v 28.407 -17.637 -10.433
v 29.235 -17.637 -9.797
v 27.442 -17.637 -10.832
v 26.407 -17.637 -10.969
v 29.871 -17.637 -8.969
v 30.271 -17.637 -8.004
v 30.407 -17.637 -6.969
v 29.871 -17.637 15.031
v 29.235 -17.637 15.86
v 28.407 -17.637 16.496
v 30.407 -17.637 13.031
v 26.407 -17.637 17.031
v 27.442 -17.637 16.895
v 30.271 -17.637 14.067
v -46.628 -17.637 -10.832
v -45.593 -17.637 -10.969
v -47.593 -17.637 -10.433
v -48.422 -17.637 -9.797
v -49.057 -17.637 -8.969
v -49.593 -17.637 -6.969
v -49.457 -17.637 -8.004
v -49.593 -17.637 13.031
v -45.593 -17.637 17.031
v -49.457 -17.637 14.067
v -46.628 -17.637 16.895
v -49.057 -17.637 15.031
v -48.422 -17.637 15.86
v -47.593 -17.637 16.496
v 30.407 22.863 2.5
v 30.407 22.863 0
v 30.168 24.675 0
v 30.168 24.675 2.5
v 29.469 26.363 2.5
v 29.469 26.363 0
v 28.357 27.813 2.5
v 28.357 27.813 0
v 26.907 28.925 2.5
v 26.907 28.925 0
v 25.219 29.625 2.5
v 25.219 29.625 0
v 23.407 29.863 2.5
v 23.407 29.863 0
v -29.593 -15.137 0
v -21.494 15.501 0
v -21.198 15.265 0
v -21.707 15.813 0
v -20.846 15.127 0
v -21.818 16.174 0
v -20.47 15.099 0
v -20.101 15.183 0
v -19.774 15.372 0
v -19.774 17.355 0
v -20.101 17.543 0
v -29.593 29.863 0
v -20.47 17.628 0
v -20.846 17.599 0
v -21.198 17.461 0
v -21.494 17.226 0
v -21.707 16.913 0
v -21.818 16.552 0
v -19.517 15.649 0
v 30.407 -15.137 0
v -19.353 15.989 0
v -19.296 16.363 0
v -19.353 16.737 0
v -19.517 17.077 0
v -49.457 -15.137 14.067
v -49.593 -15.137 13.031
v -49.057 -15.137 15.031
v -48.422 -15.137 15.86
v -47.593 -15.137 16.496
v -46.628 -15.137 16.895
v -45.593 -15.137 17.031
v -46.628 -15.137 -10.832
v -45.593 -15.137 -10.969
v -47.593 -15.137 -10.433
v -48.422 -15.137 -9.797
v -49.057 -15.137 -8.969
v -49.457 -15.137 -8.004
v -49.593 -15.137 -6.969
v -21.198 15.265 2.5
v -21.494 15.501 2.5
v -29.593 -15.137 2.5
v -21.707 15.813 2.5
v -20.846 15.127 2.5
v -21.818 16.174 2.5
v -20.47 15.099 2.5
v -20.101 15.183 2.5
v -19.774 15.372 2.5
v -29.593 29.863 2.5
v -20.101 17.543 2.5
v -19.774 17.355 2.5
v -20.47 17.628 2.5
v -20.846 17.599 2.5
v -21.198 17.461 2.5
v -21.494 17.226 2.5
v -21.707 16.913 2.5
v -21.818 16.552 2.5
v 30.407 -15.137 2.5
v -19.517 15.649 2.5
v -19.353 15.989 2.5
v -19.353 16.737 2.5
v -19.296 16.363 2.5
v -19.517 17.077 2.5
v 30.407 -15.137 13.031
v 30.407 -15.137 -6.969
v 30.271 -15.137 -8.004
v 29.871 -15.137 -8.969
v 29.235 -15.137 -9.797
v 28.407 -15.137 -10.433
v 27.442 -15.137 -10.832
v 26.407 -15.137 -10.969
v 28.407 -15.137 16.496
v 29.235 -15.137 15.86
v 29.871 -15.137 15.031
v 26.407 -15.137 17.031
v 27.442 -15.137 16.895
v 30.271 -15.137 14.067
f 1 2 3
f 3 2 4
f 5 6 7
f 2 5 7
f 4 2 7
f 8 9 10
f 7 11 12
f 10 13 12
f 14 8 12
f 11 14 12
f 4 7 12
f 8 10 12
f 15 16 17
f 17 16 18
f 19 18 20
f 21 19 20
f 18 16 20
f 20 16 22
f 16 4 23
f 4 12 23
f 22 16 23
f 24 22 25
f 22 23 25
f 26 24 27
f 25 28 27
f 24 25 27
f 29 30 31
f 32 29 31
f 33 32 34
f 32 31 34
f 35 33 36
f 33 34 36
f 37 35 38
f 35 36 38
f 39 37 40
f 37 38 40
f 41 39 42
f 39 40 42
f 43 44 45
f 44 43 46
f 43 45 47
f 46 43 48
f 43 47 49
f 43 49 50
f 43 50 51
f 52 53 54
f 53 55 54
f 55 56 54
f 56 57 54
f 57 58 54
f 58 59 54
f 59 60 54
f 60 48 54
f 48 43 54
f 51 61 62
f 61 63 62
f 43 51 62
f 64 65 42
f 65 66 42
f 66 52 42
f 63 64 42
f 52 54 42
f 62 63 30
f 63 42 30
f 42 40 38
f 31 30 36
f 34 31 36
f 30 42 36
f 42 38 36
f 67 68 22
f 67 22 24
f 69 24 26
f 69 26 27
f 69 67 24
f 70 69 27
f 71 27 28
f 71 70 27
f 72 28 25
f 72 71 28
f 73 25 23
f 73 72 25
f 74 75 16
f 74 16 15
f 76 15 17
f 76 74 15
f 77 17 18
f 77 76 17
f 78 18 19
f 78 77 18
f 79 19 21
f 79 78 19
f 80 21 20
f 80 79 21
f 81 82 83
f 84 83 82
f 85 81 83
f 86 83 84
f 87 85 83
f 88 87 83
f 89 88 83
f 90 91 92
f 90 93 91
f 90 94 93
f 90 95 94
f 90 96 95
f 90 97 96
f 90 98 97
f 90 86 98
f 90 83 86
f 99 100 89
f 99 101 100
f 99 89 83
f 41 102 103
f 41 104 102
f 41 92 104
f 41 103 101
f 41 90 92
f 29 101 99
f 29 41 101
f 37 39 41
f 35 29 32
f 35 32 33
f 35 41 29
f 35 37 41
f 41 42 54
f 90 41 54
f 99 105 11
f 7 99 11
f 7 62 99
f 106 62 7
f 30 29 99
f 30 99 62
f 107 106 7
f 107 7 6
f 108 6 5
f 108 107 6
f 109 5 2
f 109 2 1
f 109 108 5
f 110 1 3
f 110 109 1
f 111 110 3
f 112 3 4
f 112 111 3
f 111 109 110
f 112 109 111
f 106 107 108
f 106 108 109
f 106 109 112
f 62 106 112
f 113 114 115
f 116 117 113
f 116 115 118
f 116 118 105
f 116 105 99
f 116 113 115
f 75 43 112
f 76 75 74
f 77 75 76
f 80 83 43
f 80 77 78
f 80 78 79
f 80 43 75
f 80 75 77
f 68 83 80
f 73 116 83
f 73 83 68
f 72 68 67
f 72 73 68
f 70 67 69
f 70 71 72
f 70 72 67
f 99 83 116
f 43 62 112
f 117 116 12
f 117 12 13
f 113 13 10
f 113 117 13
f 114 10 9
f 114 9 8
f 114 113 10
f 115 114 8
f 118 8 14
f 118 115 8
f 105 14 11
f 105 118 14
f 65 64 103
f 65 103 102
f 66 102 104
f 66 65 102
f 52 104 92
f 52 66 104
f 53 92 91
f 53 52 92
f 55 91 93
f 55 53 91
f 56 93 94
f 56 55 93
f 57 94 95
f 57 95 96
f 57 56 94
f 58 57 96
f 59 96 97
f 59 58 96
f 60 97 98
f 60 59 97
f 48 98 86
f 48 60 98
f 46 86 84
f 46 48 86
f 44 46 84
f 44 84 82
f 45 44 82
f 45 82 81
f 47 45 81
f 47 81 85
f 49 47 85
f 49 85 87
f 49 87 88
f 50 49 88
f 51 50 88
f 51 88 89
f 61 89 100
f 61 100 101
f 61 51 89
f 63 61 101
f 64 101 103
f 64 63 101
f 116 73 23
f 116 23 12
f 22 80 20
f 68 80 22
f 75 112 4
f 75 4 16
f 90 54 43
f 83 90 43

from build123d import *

# Parameters (mm, degrees)
CROQUIS4_R              = 1.267922183
SALIENTE_EXTRUIR3_DEPTH = 2.5
SALIENTE_EXTRUIR4_DEPTH = 2.5


with BuildPart() as part:
    # Croquis4 → Saliente-Extruir3 (new body)
    with BuildSketch(Plane.XY):
        with BuildLine():
            Line((30.406912218, -15.136800989), (30.406912218, 22.863199011))
            ThreePointArc((30.406912218, 22.863199011), (28.356659686, 27.812946479), (23.406912218, 29.863199011))
            Line((23.406912218, 29.863199011), (-29.593087782, 29.863199011))
            Line((-29.593087782, 29.863199011), (-29.593087782, -15.136800989))
            Line((-29.593087782, -15.136800989), (30.406912218, -15.136800989))
        make_face()
        with Locations((-20.564298519, 16.363199011)):
            Circle(CROQUIS4_R, mode=Mode.SUBTRACT)
    extrude(amount=SALIENTE_EXTRUIR3_DEPTH)

    # Croquis5 → Saliente-Extruir4 (add)
    with BuildSketch(Plane.XZ.offset(15.136800989)):
        with BuildLine():
            Line((30.406912218, 13.031466978), (30.406912218, -6.968533022))
            ThreePointArc((30.406912218, -6.968533022), (29.235339342, -9.796960146), (26.406912218, -10.968533022))
            Line((26.406912218, -10.968533022), (-45.593087782, -10.968533022))
            ThreePointArc((-45.593087782, -10.968533022), (-48.421514907, -9.796960146), (-49.593087782, -6.968533022))
            Line((-49.593087782, -6.968533022), (-49.593087782, 13.031466978))
            ThreePointArc((-49.593087782, 13.031466978), (-48.421514907, 15.859894103), (-45.593087782, 17.031466978))
            Line((-45.593087782, 17.031466978), (26.406912218, 17.031466978))
            ThreePointArc((26.406912218, 17.031466978), (29.235339342, 15.859894103), (30.406912218, 13.031466978))
        make_face()
    extrude(amount=SALIENTE_EXTRUIR4_DEPTH)


solid = part.part
